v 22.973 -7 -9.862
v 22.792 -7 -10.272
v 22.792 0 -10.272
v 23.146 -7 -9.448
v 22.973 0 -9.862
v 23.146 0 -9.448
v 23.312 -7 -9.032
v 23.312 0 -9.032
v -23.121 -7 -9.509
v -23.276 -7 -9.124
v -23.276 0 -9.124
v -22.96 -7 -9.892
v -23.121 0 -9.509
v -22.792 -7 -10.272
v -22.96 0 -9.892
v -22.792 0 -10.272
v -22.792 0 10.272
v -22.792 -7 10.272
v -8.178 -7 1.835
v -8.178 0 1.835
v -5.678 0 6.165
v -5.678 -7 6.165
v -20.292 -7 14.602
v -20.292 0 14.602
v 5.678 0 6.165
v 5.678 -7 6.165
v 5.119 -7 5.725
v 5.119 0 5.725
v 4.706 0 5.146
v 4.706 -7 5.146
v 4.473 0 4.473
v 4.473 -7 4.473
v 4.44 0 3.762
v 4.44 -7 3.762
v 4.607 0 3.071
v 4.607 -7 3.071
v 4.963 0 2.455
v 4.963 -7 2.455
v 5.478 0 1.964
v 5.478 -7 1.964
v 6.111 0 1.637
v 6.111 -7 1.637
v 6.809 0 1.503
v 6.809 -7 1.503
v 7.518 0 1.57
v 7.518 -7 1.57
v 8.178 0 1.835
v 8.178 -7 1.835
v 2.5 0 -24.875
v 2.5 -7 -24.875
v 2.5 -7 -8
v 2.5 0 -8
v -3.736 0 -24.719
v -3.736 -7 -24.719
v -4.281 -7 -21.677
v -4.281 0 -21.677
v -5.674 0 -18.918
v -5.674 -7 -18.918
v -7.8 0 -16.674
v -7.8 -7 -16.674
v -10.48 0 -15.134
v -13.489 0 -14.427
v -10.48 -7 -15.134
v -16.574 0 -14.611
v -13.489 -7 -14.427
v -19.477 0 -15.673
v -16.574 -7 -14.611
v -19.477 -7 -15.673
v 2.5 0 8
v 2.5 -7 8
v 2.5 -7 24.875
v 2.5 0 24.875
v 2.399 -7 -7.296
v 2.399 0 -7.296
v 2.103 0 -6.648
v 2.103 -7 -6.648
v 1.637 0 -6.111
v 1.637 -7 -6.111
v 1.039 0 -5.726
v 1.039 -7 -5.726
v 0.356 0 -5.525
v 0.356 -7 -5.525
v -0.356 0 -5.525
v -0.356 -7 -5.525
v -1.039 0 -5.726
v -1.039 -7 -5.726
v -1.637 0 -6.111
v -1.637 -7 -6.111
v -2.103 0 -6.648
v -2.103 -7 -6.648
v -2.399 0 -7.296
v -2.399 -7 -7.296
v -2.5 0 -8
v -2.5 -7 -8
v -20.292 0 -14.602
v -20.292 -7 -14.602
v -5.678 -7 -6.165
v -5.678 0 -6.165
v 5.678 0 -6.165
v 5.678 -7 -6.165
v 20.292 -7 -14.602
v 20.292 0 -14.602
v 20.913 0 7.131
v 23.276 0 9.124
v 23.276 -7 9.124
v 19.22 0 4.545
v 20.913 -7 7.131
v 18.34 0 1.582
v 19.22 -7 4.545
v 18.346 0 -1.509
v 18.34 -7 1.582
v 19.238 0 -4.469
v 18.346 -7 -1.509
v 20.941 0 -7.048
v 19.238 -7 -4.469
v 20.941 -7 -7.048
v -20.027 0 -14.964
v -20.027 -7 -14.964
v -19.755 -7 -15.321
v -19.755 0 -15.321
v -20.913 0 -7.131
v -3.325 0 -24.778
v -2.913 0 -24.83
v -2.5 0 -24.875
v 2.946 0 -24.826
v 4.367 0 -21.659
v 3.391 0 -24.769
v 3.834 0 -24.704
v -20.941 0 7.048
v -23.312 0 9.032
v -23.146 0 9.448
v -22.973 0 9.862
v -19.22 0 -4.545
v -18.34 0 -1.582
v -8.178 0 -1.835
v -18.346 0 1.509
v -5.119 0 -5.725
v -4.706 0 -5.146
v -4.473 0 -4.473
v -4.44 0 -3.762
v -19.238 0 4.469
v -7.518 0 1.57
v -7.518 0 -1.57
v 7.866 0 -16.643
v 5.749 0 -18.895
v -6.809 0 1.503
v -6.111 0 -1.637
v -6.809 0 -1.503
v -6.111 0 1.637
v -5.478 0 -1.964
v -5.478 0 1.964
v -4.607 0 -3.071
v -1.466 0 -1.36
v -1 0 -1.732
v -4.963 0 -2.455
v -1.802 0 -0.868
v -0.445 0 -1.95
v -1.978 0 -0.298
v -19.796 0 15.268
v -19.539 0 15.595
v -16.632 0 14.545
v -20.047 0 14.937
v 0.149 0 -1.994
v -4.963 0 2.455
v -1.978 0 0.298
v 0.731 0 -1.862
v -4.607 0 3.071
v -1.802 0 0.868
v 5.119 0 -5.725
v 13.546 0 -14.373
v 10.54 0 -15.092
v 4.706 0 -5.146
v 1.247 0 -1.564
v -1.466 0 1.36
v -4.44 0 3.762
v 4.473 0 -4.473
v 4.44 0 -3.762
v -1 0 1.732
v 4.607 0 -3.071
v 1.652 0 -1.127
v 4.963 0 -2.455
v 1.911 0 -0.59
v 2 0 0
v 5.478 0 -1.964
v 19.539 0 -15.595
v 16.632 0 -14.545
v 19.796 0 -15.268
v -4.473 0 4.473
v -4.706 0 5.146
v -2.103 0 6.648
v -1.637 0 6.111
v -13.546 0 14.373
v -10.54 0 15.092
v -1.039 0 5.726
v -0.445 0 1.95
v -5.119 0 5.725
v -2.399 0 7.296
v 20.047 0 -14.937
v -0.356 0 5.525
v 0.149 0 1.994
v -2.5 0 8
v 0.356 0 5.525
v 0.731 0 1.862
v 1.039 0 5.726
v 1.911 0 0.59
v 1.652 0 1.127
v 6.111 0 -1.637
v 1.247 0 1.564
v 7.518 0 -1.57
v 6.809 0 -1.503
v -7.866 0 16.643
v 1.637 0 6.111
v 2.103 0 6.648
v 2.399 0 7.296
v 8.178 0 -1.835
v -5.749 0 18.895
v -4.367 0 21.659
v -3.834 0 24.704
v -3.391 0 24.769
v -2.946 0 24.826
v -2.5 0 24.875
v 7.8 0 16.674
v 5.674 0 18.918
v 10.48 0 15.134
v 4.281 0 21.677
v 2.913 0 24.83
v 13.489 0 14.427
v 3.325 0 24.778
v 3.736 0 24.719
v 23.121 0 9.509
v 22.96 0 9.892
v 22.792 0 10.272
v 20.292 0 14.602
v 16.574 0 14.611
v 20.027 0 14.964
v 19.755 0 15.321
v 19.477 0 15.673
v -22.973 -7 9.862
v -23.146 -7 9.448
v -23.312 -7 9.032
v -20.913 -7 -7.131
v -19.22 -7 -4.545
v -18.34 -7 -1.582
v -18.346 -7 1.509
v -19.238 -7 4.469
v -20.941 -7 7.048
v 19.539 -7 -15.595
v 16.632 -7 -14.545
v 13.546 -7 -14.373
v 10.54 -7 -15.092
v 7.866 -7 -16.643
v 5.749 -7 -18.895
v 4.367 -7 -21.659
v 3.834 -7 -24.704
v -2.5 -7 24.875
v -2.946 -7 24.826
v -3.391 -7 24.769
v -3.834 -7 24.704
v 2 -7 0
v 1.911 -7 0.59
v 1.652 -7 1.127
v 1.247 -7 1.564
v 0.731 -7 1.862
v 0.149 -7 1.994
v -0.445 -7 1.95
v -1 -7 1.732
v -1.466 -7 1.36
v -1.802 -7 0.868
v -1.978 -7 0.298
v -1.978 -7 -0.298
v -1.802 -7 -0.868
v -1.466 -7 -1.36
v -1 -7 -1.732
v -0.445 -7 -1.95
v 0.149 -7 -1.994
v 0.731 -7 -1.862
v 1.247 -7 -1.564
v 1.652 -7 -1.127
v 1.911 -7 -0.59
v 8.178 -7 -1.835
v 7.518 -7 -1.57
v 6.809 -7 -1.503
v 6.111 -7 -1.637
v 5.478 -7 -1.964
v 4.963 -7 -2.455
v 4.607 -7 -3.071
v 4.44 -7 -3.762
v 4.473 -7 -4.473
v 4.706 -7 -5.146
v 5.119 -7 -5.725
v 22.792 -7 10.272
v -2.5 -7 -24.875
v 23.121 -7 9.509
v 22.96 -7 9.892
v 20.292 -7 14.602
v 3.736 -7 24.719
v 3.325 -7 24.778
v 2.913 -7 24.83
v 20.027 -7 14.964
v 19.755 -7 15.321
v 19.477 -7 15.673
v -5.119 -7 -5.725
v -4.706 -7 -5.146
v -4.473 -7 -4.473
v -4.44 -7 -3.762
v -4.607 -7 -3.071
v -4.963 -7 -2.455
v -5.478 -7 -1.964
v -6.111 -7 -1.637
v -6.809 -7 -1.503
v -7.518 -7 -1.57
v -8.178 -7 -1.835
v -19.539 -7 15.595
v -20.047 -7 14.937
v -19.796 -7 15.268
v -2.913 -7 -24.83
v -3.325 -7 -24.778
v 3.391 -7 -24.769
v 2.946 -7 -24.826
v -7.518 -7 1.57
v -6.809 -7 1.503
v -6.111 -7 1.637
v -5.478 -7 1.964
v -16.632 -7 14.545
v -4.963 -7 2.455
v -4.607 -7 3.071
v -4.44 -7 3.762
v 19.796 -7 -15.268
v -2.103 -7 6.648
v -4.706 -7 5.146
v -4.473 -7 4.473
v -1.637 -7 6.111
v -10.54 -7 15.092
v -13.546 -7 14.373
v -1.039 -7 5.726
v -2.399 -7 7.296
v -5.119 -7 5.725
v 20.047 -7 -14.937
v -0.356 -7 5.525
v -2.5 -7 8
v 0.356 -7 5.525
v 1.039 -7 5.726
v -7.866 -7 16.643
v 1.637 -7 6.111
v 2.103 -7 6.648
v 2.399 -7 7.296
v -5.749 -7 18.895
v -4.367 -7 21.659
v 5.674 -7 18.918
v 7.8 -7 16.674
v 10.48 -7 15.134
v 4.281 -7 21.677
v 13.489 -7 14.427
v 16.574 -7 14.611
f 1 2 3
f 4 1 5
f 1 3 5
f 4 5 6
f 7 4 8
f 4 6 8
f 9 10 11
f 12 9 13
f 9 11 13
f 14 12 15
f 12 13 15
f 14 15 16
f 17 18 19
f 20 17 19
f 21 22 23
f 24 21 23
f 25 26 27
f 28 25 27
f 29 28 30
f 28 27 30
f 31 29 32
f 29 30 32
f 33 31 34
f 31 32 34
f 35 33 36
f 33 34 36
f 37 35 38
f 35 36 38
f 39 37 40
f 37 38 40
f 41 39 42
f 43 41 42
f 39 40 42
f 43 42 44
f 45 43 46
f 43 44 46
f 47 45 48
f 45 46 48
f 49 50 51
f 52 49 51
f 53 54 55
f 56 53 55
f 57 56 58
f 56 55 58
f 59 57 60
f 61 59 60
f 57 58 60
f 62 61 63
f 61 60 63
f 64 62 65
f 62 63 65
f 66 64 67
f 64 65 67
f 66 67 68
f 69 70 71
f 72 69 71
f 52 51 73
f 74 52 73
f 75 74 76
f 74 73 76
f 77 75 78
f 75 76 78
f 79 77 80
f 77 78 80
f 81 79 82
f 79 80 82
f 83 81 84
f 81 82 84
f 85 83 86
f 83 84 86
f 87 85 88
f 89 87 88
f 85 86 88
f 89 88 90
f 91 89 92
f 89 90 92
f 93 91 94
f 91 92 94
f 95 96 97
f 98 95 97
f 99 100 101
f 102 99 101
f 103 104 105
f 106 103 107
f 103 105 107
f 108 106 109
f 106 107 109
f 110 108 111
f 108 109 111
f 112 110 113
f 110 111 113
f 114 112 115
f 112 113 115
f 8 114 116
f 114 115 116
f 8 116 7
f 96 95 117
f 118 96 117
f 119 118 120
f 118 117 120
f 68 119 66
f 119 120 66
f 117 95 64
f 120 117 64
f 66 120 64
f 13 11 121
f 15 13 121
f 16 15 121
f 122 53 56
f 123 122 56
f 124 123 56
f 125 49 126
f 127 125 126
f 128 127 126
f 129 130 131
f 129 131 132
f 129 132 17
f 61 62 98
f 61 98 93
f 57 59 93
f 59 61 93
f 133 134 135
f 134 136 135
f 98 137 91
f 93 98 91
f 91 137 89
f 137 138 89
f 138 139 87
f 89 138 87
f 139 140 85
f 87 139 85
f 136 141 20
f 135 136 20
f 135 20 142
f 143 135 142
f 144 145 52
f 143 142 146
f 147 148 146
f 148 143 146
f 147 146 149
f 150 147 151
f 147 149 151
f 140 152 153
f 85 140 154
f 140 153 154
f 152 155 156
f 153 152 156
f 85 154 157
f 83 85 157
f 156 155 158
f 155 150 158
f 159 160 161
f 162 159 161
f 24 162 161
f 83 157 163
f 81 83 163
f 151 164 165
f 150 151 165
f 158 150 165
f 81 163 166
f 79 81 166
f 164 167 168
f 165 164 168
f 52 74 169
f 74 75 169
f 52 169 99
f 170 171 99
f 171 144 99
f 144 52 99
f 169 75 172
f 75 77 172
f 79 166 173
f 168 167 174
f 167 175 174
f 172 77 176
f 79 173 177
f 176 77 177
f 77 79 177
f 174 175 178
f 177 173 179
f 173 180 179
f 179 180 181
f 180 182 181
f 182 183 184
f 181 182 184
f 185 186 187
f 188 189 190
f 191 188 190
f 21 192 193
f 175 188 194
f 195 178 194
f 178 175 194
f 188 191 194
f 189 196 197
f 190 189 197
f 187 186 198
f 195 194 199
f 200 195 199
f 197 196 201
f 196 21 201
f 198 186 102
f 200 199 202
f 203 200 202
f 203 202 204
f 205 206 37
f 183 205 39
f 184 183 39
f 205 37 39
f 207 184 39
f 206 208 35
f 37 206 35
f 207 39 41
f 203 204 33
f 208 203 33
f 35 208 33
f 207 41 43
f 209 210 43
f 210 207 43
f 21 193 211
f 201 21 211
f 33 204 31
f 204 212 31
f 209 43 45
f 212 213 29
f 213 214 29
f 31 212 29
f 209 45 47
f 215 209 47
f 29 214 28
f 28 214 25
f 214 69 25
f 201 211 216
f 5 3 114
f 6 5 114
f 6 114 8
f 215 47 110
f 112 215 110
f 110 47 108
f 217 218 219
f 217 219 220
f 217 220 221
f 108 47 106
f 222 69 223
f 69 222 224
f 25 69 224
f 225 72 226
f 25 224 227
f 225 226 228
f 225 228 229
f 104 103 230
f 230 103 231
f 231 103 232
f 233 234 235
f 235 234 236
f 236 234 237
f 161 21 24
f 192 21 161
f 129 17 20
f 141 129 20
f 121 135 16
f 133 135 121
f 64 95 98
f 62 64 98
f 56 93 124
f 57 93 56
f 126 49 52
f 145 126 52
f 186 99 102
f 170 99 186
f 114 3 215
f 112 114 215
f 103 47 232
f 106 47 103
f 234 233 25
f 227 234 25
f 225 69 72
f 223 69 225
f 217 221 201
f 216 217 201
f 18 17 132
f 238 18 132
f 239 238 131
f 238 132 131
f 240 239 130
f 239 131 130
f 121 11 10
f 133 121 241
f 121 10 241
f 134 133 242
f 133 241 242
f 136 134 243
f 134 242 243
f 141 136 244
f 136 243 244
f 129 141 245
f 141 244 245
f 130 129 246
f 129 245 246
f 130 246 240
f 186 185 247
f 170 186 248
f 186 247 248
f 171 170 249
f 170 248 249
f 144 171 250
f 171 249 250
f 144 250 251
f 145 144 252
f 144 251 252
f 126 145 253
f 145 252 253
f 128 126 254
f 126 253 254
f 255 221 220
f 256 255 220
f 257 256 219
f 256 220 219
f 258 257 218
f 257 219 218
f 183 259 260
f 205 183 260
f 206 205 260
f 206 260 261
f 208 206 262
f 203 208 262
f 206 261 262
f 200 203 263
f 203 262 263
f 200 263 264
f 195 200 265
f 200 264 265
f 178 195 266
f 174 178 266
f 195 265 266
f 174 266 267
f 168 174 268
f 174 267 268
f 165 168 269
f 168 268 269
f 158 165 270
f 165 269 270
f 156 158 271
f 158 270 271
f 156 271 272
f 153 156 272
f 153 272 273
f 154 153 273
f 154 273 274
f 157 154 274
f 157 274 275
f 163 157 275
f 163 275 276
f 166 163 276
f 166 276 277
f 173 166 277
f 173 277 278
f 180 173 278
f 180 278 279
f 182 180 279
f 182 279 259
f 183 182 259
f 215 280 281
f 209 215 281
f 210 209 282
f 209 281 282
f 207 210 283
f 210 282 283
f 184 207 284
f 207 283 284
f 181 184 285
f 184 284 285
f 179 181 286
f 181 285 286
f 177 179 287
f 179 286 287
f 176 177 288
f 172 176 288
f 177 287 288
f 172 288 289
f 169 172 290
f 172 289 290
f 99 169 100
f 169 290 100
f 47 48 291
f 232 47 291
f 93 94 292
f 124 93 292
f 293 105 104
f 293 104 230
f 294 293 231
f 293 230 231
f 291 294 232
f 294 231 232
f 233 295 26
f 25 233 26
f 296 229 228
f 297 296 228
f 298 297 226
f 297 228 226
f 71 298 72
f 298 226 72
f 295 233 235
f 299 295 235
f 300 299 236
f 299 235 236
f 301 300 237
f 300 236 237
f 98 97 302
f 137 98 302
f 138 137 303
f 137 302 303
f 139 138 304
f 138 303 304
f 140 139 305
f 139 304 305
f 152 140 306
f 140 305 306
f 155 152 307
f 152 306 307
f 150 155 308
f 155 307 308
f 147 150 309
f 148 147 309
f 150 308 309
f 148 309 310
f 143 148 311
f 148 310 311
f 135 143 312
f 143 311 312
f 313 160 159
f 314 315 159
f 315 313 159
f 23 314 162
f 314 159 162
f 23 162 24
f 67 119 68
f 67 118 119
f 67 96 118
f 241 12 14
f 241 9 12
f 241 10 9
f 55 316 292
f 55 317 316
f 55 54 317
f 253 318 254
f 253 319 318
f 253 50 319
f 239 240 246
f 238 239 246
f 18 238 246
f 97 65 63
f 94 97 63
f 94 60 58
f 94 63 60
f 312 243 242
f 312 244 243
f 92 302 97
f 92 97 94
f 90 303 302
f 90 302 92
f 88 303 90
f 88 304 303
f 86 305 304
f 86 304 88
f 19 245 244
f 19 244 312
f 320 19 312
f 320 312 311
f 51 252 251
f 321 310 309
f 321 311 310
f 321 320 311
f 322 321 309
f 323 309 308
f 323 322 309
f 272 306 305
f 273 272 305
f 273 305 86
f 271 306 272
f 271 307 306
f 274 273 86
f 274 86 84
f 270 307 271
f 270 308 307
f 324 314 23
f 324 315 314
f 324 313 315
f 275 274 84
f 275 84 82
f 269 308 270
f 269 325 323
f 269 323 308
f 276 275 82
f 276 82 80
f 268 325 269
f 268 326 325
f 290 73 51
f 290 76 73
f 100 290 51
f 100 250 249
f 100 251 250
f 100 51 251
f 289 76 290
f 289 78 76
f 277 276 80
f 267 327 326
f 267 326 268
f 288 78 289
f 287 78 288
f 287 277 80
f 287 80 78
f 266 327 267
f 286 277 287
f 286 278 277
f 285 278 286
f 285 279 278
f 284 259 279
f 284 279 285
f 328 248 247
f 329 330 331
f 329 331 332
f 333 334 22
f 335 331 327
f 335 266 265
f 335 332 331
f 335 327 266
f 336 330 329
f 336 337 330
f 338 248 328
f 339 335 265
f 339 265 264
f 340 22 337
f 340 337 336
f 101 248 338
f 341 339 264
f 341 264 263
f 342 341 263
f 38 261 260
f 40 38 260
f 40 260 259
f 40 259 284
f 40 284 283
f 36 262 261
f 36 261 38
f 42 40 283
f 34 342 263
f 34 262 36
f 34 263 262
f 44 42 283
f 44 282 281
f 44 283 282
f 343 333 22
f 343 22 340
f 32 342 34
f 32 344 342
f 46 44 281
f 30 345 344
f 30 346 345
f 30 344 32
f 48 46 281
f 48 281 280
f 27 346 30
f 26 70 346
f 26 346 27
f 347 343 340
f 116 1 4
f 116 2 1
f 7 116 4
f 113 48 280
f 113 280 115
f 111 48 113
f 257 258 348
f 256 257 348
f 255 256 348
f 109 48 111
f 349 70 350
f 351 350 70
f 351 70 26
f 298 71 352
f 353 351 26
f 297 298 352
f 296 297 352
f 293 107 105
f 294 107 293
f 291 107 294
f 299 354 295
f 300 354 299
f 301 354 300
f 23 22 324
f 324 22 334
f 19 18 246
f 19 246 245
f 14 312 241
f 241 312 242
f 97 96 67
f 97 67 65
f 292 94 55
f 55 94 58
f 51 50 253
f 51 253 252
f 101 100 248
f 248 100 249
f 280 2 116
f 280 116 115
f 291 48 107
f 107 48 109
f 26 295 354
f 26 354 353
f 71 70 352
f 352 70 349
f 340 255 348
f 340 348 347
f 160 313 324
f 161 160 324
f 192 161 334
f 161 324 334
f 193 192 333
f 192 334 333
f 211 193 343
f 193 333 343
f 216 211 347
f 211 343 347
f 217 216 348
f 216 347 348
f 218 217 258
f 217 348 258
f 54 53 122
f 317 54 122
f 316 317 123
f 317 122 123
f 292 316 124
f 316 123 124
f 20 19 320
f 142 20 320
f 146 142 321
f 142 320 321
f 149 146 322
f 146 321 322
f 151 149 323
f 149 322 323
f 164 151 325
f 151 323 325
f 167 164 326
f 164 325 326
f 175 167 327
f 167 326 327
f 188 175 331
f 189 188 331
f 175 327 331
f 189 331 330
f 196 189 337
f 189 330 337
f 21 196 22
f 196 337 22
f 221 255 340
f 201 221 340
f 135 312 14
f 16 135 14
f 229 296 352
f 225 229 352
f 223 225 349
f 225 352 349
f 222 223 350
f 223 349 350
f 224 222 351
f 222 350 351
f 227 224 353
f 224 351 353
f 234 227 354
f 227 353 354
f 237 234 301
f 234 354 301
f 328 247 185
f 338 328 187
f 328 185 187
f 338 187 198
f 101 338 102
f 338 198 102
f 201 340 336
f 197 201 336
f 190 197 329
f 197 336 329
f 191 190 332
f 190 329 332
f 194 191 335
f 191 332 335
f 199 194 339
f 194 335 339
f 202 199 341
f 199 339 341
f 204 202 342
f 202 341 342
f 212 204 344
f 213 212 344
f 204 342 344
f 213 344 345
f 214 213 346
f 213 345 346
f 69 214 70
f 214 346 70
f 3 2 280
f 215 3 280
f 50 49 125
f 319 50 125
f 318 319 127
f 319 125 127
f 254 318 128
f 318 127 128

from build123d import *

# Parameters (mm, degrees)
F0_R            = 25
F1_DEPTH        = 7
F3_DEPTH        = 13.3
F3_COPIES_COUNT = 6
F4_R            = 2
F5_DEPTH        = 25


# Not quite as in the source:
# - a pattern or mirror of a feature is missing from the dataset's text; its kind, count and spacing are read off the source's solid


with BuildPart() as f1:
    # F0 (on Front) → F1 (new body)
    with BuildSketch(Plane.XZ):
        Circle(F0_R)
    extrude(amount=F1_DEPTH)

    # F2 (on face) → F3 (cut)
    with BuildSketch(Plane.XZ.offset(7)):
        with BuildLine():
            ThreePointArc((-19.5394295308, 15.5952138046), (-12.5429522443, 21.6257797315), (-3.8342431732, 24.704221892))
            ThreePointArc((-3.8342431732, 24.704221892), (-3.8311679177, 24.8520967356), (-3.8301427668, 25))
            ThreePointArc((-3.8301427668, 25), (-19.9806869892, 34.1546667609), (-19.5394295308, 15.5952138046))
        make_face()
        with BuildLine():
            ThreePointArc((-19.5394295308, 15.5952138046), (-9.1467396108, 15.7702407083), (-3.8342431732, 24.704221892))
            ThreePointArc((-3.8342431732, 24.704221892), (-12.5429522443, 21.6257797315), (-19.5394295308, 15.5952138046))
        make_face()
        with BuildLine():
            ThreePointArc((2.4968730444, 24.875), (2.4992181388, 24.9374804474), (2.5, 25))
            ThreePointArc((2.5, 25), (0, 27.5), (-2.5, 25))
            ThreePointArc((-2.5, 25), (-2.4992181388, 24.9374804474), (-2.4968730444, 24.875))
            ThreePointArc((-2.4968730444, 24.875), (0, 25), (2.4968730444, 24.875))
        make_face()
        with BuildLine():
            ThreePointArc((-2.4968730444, 24.875), (0, 22.5), (2.4968730444, 24.875))
            ThreePointArc((2.4968730444, 24.875), (0, 25), (-2.4968730444, 24.875))
        make_face()
        with BuildLine():
            ThreePointArc((2.5, 24.8746859277), (2.4984365271, 24.874843013), (2.4968730444, 24.875))
            ThreePointArc((2.4968730444, 24.875), (0, 22.5), (-2.4968730444, 24.875))
            ThreePointArc((-2.4968730444, 24.875), (-2.4984365271, 24.874843013), (-2.5, 24.8746859277))
            Line((-2.5, 24.8746859277), (-2.5, 8))
            ThreePointArc((-2.5, 8), (0, 10.5), (2.5, 8))
            Line((2.5, 8), (2.5, 24.8746859277))
        make_face()
        with BuildLine():
            ThreePointArc((-2.5, 8), (0, 5.5), (2.5, 8))
            ThreePointArc((2.5, 8), (0, 10.5), (-2.5, 8))
        make_face()
    f3 = extrude(amount=-F3_DEPTH, mode=Mode.SUBTRACT)

    # F3_copies: F3 ×6 about axis
    f3_copies_axis = Axis((0, 0, 0), (0, 1, 0))
    for i in range(1, F3_COPIES_COUNT):
        add(f3.rotate(f3_copies_axis, i * 360 / F3_COPIES_COUNT), mode=Mode.SUBTRACT)

    # F4 (on face) → F5 (cut)
    with BuildSketch(Plane.XZ.offset(7)):
        Circle(F4_R)
    extrude(amount=-F5_DEPTH, mode=Mode.SUBTRACT)


solid = f1.part
